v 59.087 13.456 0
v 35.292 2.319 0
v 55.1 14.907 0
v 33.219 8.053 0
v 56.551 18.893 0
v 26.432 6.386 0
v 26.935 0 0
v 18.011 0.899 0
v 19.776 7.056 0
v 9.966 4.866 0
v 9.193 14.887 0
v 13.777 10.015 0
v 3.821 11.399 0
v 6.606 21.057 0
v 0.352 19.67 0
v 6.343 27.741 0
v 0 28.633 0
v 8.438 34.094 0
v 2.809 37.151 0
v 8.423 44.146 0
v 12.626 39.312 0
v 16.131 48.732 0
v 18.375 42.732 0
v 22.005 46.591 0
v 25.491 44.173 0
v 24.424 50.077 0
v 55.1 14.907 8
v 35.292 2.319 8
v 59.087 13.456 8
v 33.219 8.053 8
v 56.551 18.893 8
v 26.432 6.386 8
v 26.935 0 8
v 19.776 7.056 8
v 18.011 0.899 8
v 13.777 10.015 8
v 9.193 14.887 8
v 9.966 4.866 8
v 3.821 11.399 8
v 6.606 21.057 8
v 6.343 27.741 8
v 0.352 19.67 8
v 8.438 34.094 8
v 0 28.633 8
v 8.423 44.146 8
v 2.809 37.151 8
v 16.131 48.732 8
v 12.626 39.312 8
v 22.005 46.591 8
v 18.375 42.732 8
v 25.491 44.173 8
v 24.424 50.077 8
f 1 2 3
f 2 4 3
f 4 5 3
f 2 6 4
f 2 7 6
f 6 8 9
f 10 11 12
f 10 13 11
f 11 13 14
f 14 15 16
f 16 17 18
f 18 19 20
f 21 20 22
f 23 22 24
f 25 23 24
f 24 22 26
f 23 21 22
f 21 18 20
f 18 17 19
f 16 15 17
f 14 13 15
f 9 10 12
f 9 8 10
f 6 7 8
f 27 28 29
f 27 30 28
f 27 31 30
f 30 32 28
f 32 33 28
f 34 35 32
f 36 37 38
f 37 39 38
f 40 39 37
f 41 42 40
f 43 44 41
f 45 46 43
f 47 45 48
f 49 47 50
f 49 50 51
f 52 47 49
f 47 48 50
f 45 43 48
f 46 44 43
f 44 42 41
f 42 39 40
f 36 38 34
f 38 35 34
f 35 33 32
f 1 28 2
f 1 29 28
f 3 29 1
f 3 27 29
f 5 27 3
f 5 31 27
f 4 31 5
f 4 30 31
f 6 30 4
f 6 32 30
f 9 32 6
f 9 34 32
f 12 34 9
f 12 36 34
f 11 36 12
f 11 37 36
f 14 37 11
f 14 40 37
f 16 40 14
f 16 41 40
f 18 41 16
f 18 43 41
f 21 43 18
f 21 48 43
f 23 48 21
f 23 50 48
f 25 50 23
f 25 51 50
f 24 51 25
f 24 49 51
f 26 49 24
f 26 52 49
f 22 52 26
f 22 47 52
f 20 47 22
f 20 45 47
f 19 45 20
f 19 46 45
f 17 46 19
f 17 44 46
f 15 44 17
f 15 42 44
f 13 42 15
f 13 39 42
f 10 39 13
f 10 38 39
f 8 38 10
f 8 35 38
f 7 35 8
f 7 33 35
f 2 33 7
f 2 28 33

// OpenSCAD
$fn = 32;

// ----------------------------------------------------------------------
// Hook plate: curl radius 22 mm over 205 degrees, 6 mm thick band
// ----------------------------------------------------------------------

// --- parameters (mm) ---
profile_height = 8;       // extrusion height
profile_points = 26;      // points of the closed outline

profile = [[22.005, 46.591], [24.424, 50.077], [16.131, 48.732], [8.423, 44.146], [2.809, 37.151], [0, 28.633], [0.352, 19.67], [3.821, 11.399], [9.966, 4.866], [18.011, 0.899], [26.935, 0], [35.292, 2.319], [59.087, 13.456], [55.1, 14.907], [56.551, 18.893], [33.219, 8.053], [26.432, 6.386], [19.776, 7.056], [13.777, 10.015], [9.193, 14.887], [6.606, 21.057], [6.343, 27.741], [8.438, 34.094], [12.626, 39.312], [18.375, 42.732], [25.491, 44.173]];  // single closed polygon, 26 points, counter clockwise

// --- the one profile operation ---
linear_extrude(height = profile_height) polygon(points = profile);
